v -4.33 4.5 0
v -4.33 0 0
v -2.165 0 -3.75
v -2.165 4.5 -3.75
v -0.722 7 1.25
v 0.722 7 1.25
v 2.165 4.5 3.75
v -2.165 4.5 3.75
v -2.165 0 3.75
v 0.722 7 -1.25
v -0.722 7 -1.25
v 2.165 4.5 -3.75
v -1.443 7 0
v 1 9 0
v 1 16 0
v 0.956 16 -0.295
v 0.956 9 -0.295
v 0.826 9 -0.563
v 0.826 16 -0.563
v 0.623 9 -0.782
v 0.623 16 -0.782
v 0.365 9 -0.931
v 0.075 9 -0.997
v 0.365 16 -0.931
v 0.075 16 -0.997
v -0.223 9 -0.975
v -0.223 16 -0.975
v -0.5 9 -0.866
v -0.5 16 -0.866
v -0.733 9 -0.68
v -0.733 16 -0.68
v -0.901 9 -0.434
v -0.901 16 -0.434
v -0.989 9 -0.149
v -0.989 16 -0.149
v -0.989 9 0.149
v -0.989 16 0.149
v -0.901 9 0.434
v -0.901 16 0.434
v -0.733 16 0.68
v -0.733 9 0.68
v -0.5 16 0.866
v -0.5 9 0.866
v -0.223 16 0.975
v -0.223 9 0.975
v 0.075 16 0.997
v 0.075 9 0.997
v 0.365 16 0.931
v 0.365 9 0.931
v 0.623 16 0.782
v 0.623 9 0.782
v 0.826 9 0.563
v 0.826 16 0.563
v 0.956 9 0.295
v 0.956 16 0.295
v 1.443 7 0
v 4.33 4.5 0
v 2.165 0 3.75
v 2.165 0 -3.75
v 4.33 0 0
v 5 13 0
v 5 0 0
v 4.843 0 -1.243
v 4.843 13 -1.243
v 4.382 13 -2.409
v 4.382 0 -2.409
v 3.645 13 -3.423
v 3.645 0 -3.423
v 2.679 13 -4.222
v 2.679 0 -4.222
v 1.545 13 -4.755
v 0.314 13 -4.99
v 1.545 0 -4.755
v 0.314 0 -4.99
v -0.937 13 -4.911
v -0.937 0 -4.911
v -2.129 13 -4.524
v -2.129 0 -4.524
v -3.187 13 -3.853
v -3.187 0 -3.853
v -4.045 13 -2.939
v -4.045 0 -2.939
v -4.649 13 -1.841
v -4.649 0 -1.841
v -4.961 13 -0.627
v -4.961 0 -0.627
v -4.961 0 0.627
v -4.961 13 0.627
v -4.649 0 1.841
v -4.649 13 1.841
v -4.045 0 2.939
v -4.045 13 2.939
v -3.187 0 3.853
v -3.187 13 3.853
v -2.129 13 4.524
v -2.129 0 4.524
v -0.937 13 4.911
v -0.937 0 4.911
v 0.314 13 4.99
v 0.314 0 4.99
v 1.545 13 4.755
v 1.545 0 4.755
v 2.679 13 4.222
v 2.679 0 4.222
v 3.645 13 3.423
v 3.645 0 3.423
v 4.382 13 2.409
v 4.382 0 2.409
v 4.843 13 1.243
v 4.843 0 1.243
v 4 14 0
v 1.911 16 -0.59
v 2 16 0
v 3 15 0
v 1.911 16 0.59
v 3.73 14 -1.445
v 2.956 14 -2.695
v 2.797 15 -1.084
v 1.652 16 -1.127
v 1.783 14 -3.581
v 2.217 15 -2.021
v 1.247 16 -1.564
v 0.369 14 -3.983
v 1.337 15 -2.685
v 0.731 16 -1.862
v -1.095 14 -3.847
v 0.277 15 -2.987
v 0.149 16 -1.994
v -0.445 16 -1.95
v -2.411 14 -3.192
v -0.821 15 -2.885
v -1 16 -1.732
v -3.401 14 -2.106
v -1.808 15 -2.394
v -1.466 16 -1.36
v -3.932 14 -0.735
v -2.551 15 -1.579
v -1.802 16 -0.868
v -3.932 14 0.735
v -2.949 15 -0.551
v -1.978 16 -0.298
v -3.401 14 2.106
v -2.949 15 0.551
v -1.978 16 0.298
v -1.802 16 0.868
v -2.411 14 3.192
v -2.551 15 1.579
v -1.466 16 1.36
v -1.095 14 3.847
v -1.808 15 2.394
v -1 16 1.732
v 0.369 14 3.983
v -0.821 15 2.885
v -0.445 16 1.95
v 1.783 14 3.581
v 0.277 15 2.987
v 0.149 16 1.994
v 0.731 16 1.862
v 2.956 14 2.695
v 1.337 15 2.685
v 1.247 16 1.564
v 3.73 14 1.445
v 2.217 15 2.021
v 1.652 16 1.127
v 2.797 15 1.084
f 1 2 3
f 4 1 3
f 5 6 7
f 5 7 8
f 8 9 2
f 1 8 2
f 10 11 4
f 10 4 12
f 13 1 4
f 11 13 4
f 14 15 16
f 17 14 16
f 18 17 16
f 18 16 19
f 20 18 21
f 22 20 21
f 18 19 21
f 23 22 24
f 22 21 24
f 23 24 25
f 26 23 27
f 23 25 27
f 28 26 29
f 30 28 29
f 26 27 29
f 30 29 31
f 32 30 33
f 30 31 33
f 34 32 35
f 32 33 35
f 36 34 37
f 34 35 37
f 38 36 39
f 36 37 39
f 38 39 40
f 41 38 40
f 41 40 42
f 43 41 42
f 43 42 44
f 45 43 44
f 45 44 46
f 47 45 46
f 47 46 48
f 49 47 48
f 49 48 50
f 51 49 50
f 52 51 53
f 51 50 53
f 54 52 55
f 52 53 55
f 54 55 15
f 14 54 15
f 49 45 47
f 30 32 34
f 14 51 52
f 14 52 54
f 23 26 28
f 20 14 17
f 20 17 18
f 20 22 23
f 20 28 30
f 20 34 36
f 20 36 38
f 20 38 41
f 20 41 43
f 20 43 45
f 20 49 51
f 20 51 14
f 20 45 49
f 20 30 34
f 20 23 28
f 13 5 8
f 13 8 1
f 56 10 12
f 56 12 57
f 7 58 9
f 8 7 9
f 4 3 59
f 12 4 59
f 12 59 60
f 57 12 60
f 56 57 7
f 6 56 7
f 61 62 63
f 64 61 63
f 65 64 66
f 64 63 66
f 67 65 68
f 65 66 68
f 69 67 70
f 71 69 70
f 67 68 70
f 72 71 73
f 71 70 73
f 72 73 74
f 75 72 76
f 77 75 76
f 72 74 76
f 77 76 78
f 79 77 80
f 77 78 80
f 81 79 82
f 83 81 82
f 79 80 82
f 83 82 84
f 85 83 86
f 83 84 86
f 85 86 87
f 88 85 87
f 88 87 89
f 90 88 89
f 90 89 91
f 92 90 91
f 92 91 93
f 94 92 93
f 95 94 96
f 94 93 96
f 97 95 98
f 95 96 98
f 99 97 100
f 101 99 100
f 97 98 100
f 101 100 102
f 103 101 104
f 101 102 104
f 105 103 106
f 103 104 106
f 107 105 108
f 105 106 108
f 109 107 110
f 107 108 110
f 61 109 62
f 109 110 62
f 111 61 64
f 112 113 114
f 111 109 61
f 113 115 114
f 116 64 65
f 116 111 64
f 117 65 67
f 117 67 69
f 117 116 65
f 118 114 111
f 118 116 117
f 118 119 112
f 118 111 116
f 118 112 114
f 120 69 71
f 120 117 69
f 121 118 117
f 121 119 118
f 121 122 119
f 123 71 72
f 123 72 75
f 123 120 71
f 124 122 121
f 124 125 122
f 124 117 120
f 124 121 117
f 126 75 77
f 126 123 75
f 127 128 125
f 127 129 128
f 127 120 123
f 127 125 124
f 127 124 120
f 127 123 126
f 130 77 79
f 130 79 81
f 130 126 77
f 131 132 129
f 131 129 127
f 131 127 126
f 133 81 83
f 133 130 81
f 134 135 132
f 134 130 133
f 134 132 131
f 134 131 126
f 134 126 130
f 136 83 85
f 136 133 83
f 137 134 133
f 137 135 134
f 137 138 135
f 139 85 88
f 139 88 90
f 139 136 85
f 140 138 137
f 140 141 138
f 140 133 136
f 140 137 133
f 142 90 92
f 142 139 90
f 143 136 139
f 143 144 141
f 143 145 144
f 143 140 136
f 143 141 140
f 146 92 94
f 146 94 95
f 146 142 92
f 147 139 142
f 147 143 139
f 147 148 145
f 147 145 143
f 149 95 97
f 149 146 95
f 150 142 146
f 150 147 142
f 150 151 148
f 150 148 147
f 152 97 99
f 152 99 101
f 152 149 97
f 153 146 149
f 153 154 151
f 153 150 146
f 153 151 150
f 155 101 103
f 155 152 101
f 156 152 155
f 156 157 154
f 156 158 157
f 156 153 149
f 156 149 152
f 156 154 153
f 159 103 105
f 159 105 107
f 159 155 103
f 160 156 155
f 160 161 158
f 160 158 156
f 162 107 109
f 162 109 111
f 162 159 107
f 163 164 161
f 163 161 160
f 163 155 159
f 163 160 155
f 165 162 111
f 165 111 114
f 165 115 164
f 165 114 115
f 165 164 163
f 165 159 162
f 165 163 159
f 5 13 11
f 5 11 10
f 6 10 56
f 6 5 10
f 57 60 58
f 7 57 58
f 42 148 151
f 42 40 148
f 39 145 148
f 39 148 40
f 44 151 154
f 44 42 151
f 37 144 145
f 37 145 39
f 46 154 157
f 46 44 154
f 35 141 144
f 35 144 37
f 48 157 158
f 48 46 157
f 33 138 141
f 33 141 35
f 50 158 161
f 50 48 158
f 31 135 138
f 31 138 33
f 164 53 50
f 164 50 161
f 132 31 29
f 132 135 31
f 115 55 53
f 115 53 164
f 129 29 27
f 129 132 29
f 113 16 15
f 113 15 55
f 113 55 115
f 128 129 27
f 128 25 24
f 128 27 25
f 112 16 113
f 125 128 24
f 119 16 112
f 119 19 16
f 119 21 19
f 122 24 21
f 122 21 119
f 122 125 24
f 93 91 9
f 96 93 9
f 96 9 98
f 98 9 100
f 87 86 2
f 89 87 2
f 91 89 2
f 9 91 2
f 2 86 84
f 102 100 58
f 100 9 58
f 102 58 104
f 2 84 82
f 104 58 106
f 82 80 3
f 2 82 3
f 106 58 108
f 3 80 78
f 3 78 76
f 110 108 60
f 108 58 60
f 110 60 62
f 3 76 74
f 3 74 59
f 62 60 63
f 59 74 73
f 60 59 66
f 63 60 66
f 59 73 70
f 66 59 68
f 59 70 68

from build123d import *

# Parameters (mm, degrees)
SKETCH1_R           = 5
BOSS_EXTRUDE1_DEPTH = 16
CHAMFER1_SIZE       = 3
SKETCH2_R           = 1
CUT_EXTRUDE1_DEPTH  = 7
CUT_EXTRUDE2_DEPTH  = 7
CHAMFER2_SIZE       = 2.5


with BuildPart() as part:
    # Sketch1 → Boss-Extrude1 (new body)
    with BuildSketch(Plane(origin=(0, 0, 0), x_dir=(1, 0, 0), z_dir=(0, 1, 0))):
        Circle(SKETCH1_R)
    extrude(amount=BOSS_EXTRUDE1_DEPTH)

    # Chamfer1
    chamfer1_edges = [part.edges().sort_by_distance(p)[0] for p in [
        (-5, 16, 0),
    ]]
    chamfer(chamfer1_edges, length=CHAMFER1_SIZE)

    # Sketch2 → Cut-Extrude1 (cut)
    with BuildSketch(Plane(origin=(0, 16, 0), x_dir=(1, 0, 0), z_dir=(0, 1, 0))):
        Circle(SKETCH2_R)
    extrude(amount=-CUT_EXTRUDE1_DEPTH, mode=Mode.SUBTRACT)

    # Sketch3 → Cut-Extrude2 (cut)
    with BuildSketch(Plane.XZ):
        Polygon((-2.165063509, 3.75), (-4.330127019, 0), (-2.165063509, -3.75), (2.165063509, -3.75), (4.330127019, 0), (2.165063509, 3.75), align=None)
    extrude(amount=-CUT_EXTRUDE2_DEPTH, mode=Mode.SUBTRACT)

    # Chamfer2
    chamfer2_edges = [part.edges().sort_by_distance(p)[0] for p in [
        (0, 7, 3.75),
        (3.247595264, 7, 1.875),
        (3.247595264, 7, -1.875),
        (0, 7, -3.75),
        (-3.247595264, 7, -1.875),
        (-3.247595264, 7, 1.875),
    ]]
    chamfer(chamfer2_edges, length=CHAMFER2_SIZE)


solid = part.part
